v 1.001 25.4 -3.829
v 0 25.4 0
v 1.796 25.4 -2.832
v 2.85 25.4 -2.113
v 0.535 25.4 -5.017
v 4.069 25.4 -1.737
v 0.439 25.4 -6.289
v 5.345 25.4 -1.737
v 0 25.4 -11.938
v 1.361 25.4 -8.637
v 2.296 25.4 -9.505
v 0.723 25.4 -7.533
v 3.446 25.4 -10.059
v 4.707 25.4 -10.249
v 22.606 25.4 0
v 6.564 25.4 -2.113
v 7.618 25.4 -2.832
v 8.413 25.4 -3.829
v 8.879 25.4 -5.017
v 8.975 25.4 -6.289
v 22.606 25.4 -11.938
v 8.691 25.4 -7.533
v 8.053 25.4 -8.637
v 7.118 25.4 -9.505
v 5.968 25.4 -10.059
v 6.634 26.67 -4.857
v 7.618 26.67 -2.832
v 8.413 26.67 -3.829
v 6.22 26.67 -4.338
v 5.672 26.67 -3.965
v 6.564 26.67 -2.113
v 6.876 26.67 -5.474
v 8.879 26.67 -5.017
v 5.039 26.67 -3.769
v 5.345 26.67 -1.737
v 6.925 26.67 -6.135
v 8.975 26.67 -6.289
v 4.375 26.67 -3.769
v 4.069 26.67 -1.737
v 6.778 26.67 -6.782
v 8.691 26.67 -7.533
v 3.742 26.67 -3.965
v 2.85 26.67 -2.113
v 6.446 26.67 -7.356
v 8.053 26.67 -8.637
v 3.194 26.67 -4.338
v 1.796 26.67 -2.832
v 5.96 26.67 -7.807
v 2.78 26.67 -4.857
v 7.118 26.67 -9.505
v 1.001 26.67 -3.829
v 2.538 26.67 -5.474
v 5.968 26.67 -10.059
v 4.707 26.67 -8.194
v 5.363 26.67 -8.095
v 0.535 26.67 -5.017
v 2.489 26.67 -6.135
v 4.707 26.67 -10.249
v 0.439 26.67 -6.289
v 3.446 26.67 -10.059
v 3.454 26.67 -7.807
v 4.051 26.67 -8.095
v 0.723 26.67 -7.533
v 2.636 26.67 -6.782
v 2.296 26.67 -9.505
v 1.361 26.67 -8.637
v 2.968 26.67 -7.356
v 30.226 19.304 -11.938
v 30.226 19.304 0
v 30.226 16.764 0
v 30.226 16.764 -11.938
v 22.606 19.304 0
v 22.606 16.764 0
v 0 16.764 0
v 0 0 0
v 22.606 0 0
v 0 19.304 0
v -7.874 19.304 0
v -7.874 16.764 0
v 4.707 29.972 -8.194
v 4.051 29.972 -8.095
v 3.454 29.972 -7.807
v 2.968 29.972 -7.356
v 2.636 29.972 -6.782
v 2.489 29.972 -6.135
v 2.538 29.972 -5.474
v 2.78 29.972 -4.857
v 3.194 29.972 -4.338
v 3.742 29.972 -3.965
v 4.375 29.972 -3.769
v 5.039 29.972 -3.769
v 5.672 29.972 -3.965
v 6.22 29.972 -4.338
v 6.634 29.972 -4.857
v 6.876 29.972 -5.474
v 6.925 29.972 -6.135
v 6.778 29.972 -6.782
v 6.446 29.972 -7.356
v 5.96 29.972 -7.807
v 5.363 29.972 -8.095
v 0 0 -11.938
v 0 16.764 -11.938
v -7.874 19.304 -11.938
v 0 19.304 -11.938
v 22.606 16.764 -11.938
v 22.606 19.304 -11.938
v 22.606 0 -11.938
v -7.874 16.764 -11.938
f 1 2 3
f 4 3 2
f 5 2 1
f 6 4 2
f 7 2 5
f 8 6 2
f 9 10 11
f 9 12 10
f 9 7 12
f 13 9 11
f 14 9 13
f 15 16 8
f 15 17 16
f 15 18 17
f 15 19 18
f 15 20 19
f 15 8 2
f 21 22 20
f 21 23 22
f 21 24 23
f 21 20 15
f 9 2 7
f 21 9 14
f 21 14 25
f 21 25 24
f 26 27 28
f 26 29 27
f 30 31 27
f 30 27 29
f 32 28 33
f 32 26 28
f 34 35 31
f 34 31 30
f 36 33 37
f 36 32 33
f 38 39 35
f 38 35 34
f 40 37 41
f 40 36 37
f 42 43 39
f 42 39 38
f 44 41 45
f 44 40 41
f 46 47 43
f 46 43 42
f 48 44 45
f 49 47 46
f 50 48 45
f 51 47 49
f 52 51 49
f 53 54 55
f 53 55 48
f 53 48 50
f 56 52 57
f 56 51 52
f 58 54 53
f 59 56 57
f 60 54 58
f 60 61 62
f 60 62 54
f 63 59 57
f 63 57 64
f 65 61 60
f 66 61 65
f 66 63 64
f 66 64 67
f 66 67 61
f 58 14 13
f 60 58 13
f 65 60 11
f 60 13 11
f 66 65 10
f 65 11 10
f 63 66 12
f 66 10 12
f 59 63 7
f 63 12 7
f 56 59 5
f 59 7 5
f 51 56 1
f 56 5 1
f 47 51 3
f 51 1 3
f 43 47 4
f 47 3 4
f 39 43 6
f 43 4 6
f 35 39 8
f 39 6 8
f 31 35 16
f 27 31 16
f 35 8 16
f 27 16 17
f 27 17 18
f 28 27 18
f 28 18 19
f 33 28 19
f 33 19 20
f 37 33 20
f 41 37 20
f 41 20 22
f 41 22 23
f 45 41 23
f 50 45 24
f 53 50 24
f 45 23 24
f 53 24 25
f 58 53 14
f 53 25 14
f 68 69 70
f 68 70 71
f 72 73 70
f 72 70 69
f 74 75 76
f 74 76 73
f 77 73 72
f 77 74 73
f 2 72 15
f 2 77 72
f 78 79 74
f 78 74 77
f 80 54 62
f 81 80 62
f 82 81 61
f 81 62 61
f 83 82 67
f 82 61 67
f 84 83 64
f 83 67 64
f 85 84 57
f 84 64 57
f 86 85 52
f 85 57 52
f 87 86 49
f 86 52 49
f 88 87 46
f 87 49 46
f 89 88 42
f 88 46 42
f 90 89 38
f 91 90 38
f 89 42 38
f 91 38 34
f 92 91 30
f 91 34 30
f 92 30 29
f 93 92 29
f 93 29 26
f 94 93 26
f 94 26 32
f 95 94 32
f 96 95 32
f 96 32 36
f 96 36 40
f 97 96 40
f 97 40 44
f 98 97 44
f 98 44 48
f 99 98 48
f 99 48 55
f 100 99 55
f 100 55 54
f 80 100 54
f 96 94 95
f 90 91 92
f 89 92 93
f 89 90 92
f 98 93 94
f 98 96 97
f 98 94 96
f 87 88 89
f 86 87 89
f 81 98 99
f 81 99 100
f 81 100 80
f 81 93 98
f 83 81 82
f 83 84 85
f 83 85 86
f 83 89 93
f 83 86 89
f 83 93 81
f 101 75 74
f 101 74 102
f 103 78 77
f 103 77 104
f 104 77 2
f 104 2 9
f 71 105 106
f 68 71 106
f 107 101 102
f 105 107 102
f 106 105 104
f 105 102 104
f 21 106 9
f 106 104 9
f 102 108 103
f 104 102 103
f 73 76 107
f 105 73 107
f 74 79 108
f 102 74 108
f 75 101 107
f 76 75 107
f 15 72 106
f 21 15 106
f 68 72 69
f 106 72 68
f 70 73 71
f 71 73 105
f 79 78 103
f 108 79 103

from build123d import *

# Parameters (mm, degrees)
SKETCH1_W                = 22.606
SKETCH1_H                = 11.938
BOSS_EXTRUDE1_DEPTH      = 25.4
SKETCH2_R                = 2.224672202
BOSS_EXTRUDE2_DEPTH      = 4.572
SKETCH3_R                = 4.279679958
BOSS_EXTRUDE3_DEPTH      = 1.27
BOSS_EXTRUDE4_DEPTH      = 7.62
BOSS_EXTRUDE4_DEPTH_BACK = 30.48
SKETCH4_W                = 11.938
SKETCH4_H                = 2.54


with BuildPart() as part:
    # Sketch1 → Boss-Extrude1 (new body)
    with BuildSketch(Plane(origin=(0, 0, 0), x_dir=(1, 0, 0), z_dir=(0, 1, 0))):
        with Locations((11.303, 5.969)):
            Rectangle(SKETCH1_W, SKETCH1_H)
    extrude(amount=BOSS_EXTRUDE1_DEPTH)

    # Sketch2 → Boss-Extrude2 (add)
    with BuildSketch(Plane(origin=(0, 25.4, 0), x_dir=(1, 0, 0), z_dir=(0, 1, 0))):
        with Locations(Location((4.707032939, 5.969, 0), (0, 0, 90))):
            Circle(SKETCH2_R)
    extrude(amount=BOSS_EXTRUDE2_DEPTH)

    # Sketch3 → Boss-Extrude3 (add)
    with BuildSketch(Plane(origin=(0, 25.4, 0), x_dir=(1, 0, 0), z_dir=(0, 1, 0))):
        with Locations(Location((4.707032939, 5.969, 0), (0, 0, 90))):
            Circle(SKETCH3_R)
    extrude(amount=BOSS_EXTRUDE3_DEPTH)

    # Sketch4 → Boss-Extrude4 (add, two sides: drawn at the far end of the back side and taken through both)
    with BuildSketch(Plane(origin=(22.606, 0, 0), x_dir=(0, 0, -1), z_dir=(1, 0, 0)).offset(-BOSS_EXTRUDE4_DEPTH_BACK)):
        with Locations((5.969, 18.034)):
            Rectangle(SKETCH4_W, SKETCH4_H)
    extrude(amount=BOSS_EXTRUDE4_DEPTH + BOSS_EXTRUDE4_DEPTH_BACK)


solid = part.part
